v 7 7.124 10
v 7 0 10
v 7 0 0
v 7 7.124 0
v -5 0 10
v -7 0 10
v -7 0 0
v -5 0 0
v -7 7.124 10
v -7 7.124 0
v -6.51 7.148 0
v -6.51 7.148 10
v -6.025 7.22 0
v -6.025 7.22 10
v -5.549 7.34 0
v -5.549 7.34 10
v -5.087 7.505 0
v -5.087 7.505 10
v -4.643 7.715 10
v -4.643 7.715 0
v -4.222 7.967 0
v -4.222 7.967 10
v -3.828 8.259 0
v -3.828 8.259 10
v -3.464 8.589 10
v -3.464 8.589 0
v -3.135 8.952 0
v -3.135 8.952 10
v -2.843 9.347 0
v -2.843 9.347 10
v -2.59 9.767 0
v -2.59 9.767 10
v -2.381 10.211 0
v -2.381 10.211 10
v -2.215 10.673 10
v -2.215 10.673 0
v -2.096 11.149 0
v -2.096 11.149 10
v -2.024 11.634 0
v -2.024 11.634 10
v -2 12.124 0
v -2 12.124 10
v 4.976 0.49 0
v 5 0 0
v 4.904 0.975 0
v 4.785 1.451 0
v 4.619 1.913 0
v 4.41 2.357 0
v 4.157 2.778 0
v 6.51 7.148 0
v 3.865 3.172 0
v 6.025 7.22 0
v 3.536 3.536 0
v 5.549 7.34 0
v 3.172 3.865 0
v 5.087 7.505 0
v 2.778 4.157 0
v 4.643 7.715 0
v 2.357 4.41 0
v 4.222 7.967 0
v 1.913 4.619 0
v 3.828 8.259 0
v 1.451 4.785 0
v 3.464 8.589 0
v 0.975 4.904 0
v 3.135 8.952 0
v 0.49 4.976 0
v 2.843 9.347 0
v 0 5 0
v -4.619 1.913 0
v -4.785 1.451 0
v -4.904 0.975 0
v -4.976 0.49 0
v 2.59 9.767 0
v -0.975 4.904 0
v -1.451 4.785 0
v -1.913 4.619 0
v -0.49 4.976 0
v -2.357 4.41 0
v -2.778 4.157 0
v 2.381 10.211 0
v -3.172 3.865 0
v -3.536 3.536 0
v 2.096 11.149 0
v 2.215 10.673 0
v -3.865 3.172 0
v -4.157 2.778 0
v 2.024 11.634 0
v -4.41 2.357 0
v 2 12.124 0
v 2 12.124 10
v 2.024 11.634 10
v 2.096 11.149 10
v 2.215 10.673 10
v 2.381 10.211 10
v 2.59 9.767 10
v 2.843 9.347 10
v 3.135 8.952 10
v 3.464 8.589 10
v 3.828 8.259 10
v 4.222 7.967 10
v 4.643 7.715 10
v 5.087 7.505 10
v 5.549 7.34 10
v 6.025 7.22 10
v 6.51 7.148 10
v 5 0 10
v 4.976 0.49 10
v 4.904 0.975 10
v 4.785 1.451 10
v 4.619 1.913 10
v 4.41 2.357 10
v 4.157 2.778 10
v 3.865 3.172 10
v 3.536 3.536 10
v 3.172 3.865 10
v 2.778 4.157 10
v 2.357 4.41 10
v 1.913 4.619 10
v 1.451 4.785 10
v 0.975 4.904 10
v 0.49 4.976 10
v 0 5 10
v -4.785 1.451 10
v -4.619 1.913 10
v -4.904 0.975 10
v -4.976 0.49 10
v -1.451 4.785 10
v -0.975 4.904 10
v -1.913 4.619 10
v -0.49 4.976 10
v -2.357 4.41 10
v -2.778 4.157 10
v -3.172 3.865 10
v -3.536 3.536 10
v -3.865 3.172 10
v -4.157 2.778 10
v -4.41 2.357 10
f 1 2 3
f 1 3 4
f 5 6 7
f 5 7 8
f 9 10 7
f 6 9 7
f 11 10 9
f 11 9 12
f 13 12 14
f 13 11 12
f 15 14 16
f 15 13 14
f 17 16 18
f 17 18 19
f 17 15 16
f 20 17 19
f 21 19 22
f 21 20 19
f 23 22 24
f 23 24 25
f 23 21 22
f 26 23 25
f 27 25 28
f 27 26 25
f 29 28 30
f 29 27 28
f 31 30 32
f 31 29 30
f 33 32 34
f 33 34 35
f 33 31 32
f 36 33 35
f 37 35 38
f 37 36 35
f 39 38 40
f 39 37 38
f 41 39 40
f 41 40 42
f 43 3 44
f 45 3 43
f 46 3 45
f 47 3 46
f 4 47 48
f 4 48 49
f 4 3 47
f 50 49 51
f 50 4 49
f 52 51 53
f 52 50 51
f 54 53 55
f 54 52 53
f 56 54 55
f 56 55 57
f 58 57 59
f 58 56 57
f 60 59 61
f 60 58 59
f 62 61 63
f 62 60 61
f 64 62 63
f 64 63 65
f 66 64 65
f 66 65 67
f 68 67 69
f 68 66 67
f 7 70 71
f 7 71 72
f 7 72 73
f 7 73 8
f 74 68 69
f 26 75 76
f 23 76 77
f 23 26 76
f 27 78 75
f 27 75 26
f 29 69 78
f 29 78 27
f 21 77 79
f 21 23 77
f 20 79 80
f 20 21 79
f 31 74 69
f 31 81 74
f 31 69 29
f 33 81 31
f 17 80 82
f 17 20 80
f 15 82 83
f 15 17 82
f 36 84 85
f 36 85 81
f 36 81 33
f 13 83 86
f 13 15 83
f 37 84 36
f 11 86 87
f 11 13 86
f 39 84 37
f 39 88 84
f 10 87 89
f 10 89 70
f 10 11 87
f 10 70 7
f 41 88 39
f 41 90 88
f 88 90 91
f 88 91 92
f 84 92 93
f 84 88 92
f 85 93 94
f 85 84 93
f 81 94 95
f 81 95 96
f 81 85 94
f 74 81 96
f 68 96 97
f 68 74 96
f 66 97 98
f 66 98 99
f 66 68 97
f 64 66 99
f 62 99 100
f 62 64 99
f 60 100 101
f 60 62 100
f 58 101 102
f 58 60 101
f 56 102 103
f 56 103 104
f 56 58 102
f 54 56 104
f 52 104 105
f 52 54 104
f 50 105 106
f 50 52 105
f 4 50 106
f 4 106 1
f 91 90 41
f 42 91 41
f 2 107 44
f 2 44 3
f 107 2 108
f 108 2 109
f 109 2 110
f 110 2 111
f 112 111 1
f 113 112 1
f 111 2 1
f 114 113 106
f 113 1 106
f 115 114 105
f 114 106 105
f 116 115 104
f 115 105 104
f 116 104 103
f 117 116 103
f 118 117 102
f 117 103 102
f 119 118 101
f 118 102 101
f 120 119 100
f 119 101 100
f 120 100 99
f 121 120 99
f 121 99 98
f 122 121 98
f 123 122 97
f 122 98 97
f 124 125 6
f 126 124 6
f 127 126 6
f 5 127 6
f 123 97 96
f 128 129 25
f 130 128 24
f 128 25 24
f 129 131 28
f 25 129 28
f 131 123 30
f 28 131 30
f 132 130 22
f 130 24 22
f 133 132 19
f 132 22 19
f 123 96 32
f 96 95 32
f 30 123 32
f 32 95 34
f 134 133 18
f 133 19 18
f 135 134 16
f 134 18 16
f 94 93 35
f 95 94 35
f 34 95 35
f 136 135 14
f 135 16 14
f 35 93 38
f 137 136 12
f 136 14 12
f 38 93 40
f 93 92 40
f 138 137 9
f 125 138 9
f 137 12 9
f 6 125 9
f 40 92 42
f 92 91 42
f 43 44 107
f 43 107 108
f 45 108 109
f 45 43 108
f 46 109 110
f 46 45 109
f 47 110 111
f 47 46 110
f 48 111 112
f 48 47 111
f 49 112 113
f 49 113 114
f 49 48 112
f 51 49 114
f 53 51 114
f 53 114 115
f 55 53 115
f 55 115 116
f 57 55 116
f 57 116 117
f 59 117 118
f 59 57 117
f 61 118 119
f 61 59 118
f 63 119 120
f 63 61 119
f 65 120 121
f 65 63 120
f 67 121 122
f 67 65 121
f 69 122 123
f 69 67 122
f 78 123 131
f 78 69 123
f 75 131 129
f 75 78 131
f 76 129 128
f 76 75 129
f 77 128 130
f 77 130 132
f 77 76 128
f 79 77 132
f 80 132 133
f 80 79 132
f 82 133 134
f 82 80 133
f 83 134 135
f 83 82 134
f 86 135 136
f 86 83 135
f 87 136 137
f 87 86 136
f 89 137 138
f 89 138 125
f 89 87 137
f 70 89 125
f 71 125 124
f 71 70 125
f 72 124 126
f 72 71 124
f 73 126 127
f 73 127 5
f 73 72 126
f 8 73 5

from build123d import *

# Parameters (mm, degrees)
PAD_DEPTH = 10


with BuildPart() as part:
    # Sketch → Pad (new body)
    with BuildSketch(Plane.XY):
        with BuildLine():
            ThreePointArc((5, 0), (0, 5), (-5, 0))
            Line((-7, 0), (-5, 0))
            Line((-7, 7.124356), (-7, 0))
            ThreePointArc((-7, 7.124356), (-3.464466, 8.588822), (-2, 12.124356))
            Line((2, 12.124356), (-2, 12.124356))
            ThreePointArc((2, 12.124356), (3.464466, 8.588822), (7, 7.124356))
            Line((7, 0), (7, 7.124356))
            Line((5, 0), (7, 0))
        make_face()
    extrude(amount=PAD_DEPTH)


solid = part.part
